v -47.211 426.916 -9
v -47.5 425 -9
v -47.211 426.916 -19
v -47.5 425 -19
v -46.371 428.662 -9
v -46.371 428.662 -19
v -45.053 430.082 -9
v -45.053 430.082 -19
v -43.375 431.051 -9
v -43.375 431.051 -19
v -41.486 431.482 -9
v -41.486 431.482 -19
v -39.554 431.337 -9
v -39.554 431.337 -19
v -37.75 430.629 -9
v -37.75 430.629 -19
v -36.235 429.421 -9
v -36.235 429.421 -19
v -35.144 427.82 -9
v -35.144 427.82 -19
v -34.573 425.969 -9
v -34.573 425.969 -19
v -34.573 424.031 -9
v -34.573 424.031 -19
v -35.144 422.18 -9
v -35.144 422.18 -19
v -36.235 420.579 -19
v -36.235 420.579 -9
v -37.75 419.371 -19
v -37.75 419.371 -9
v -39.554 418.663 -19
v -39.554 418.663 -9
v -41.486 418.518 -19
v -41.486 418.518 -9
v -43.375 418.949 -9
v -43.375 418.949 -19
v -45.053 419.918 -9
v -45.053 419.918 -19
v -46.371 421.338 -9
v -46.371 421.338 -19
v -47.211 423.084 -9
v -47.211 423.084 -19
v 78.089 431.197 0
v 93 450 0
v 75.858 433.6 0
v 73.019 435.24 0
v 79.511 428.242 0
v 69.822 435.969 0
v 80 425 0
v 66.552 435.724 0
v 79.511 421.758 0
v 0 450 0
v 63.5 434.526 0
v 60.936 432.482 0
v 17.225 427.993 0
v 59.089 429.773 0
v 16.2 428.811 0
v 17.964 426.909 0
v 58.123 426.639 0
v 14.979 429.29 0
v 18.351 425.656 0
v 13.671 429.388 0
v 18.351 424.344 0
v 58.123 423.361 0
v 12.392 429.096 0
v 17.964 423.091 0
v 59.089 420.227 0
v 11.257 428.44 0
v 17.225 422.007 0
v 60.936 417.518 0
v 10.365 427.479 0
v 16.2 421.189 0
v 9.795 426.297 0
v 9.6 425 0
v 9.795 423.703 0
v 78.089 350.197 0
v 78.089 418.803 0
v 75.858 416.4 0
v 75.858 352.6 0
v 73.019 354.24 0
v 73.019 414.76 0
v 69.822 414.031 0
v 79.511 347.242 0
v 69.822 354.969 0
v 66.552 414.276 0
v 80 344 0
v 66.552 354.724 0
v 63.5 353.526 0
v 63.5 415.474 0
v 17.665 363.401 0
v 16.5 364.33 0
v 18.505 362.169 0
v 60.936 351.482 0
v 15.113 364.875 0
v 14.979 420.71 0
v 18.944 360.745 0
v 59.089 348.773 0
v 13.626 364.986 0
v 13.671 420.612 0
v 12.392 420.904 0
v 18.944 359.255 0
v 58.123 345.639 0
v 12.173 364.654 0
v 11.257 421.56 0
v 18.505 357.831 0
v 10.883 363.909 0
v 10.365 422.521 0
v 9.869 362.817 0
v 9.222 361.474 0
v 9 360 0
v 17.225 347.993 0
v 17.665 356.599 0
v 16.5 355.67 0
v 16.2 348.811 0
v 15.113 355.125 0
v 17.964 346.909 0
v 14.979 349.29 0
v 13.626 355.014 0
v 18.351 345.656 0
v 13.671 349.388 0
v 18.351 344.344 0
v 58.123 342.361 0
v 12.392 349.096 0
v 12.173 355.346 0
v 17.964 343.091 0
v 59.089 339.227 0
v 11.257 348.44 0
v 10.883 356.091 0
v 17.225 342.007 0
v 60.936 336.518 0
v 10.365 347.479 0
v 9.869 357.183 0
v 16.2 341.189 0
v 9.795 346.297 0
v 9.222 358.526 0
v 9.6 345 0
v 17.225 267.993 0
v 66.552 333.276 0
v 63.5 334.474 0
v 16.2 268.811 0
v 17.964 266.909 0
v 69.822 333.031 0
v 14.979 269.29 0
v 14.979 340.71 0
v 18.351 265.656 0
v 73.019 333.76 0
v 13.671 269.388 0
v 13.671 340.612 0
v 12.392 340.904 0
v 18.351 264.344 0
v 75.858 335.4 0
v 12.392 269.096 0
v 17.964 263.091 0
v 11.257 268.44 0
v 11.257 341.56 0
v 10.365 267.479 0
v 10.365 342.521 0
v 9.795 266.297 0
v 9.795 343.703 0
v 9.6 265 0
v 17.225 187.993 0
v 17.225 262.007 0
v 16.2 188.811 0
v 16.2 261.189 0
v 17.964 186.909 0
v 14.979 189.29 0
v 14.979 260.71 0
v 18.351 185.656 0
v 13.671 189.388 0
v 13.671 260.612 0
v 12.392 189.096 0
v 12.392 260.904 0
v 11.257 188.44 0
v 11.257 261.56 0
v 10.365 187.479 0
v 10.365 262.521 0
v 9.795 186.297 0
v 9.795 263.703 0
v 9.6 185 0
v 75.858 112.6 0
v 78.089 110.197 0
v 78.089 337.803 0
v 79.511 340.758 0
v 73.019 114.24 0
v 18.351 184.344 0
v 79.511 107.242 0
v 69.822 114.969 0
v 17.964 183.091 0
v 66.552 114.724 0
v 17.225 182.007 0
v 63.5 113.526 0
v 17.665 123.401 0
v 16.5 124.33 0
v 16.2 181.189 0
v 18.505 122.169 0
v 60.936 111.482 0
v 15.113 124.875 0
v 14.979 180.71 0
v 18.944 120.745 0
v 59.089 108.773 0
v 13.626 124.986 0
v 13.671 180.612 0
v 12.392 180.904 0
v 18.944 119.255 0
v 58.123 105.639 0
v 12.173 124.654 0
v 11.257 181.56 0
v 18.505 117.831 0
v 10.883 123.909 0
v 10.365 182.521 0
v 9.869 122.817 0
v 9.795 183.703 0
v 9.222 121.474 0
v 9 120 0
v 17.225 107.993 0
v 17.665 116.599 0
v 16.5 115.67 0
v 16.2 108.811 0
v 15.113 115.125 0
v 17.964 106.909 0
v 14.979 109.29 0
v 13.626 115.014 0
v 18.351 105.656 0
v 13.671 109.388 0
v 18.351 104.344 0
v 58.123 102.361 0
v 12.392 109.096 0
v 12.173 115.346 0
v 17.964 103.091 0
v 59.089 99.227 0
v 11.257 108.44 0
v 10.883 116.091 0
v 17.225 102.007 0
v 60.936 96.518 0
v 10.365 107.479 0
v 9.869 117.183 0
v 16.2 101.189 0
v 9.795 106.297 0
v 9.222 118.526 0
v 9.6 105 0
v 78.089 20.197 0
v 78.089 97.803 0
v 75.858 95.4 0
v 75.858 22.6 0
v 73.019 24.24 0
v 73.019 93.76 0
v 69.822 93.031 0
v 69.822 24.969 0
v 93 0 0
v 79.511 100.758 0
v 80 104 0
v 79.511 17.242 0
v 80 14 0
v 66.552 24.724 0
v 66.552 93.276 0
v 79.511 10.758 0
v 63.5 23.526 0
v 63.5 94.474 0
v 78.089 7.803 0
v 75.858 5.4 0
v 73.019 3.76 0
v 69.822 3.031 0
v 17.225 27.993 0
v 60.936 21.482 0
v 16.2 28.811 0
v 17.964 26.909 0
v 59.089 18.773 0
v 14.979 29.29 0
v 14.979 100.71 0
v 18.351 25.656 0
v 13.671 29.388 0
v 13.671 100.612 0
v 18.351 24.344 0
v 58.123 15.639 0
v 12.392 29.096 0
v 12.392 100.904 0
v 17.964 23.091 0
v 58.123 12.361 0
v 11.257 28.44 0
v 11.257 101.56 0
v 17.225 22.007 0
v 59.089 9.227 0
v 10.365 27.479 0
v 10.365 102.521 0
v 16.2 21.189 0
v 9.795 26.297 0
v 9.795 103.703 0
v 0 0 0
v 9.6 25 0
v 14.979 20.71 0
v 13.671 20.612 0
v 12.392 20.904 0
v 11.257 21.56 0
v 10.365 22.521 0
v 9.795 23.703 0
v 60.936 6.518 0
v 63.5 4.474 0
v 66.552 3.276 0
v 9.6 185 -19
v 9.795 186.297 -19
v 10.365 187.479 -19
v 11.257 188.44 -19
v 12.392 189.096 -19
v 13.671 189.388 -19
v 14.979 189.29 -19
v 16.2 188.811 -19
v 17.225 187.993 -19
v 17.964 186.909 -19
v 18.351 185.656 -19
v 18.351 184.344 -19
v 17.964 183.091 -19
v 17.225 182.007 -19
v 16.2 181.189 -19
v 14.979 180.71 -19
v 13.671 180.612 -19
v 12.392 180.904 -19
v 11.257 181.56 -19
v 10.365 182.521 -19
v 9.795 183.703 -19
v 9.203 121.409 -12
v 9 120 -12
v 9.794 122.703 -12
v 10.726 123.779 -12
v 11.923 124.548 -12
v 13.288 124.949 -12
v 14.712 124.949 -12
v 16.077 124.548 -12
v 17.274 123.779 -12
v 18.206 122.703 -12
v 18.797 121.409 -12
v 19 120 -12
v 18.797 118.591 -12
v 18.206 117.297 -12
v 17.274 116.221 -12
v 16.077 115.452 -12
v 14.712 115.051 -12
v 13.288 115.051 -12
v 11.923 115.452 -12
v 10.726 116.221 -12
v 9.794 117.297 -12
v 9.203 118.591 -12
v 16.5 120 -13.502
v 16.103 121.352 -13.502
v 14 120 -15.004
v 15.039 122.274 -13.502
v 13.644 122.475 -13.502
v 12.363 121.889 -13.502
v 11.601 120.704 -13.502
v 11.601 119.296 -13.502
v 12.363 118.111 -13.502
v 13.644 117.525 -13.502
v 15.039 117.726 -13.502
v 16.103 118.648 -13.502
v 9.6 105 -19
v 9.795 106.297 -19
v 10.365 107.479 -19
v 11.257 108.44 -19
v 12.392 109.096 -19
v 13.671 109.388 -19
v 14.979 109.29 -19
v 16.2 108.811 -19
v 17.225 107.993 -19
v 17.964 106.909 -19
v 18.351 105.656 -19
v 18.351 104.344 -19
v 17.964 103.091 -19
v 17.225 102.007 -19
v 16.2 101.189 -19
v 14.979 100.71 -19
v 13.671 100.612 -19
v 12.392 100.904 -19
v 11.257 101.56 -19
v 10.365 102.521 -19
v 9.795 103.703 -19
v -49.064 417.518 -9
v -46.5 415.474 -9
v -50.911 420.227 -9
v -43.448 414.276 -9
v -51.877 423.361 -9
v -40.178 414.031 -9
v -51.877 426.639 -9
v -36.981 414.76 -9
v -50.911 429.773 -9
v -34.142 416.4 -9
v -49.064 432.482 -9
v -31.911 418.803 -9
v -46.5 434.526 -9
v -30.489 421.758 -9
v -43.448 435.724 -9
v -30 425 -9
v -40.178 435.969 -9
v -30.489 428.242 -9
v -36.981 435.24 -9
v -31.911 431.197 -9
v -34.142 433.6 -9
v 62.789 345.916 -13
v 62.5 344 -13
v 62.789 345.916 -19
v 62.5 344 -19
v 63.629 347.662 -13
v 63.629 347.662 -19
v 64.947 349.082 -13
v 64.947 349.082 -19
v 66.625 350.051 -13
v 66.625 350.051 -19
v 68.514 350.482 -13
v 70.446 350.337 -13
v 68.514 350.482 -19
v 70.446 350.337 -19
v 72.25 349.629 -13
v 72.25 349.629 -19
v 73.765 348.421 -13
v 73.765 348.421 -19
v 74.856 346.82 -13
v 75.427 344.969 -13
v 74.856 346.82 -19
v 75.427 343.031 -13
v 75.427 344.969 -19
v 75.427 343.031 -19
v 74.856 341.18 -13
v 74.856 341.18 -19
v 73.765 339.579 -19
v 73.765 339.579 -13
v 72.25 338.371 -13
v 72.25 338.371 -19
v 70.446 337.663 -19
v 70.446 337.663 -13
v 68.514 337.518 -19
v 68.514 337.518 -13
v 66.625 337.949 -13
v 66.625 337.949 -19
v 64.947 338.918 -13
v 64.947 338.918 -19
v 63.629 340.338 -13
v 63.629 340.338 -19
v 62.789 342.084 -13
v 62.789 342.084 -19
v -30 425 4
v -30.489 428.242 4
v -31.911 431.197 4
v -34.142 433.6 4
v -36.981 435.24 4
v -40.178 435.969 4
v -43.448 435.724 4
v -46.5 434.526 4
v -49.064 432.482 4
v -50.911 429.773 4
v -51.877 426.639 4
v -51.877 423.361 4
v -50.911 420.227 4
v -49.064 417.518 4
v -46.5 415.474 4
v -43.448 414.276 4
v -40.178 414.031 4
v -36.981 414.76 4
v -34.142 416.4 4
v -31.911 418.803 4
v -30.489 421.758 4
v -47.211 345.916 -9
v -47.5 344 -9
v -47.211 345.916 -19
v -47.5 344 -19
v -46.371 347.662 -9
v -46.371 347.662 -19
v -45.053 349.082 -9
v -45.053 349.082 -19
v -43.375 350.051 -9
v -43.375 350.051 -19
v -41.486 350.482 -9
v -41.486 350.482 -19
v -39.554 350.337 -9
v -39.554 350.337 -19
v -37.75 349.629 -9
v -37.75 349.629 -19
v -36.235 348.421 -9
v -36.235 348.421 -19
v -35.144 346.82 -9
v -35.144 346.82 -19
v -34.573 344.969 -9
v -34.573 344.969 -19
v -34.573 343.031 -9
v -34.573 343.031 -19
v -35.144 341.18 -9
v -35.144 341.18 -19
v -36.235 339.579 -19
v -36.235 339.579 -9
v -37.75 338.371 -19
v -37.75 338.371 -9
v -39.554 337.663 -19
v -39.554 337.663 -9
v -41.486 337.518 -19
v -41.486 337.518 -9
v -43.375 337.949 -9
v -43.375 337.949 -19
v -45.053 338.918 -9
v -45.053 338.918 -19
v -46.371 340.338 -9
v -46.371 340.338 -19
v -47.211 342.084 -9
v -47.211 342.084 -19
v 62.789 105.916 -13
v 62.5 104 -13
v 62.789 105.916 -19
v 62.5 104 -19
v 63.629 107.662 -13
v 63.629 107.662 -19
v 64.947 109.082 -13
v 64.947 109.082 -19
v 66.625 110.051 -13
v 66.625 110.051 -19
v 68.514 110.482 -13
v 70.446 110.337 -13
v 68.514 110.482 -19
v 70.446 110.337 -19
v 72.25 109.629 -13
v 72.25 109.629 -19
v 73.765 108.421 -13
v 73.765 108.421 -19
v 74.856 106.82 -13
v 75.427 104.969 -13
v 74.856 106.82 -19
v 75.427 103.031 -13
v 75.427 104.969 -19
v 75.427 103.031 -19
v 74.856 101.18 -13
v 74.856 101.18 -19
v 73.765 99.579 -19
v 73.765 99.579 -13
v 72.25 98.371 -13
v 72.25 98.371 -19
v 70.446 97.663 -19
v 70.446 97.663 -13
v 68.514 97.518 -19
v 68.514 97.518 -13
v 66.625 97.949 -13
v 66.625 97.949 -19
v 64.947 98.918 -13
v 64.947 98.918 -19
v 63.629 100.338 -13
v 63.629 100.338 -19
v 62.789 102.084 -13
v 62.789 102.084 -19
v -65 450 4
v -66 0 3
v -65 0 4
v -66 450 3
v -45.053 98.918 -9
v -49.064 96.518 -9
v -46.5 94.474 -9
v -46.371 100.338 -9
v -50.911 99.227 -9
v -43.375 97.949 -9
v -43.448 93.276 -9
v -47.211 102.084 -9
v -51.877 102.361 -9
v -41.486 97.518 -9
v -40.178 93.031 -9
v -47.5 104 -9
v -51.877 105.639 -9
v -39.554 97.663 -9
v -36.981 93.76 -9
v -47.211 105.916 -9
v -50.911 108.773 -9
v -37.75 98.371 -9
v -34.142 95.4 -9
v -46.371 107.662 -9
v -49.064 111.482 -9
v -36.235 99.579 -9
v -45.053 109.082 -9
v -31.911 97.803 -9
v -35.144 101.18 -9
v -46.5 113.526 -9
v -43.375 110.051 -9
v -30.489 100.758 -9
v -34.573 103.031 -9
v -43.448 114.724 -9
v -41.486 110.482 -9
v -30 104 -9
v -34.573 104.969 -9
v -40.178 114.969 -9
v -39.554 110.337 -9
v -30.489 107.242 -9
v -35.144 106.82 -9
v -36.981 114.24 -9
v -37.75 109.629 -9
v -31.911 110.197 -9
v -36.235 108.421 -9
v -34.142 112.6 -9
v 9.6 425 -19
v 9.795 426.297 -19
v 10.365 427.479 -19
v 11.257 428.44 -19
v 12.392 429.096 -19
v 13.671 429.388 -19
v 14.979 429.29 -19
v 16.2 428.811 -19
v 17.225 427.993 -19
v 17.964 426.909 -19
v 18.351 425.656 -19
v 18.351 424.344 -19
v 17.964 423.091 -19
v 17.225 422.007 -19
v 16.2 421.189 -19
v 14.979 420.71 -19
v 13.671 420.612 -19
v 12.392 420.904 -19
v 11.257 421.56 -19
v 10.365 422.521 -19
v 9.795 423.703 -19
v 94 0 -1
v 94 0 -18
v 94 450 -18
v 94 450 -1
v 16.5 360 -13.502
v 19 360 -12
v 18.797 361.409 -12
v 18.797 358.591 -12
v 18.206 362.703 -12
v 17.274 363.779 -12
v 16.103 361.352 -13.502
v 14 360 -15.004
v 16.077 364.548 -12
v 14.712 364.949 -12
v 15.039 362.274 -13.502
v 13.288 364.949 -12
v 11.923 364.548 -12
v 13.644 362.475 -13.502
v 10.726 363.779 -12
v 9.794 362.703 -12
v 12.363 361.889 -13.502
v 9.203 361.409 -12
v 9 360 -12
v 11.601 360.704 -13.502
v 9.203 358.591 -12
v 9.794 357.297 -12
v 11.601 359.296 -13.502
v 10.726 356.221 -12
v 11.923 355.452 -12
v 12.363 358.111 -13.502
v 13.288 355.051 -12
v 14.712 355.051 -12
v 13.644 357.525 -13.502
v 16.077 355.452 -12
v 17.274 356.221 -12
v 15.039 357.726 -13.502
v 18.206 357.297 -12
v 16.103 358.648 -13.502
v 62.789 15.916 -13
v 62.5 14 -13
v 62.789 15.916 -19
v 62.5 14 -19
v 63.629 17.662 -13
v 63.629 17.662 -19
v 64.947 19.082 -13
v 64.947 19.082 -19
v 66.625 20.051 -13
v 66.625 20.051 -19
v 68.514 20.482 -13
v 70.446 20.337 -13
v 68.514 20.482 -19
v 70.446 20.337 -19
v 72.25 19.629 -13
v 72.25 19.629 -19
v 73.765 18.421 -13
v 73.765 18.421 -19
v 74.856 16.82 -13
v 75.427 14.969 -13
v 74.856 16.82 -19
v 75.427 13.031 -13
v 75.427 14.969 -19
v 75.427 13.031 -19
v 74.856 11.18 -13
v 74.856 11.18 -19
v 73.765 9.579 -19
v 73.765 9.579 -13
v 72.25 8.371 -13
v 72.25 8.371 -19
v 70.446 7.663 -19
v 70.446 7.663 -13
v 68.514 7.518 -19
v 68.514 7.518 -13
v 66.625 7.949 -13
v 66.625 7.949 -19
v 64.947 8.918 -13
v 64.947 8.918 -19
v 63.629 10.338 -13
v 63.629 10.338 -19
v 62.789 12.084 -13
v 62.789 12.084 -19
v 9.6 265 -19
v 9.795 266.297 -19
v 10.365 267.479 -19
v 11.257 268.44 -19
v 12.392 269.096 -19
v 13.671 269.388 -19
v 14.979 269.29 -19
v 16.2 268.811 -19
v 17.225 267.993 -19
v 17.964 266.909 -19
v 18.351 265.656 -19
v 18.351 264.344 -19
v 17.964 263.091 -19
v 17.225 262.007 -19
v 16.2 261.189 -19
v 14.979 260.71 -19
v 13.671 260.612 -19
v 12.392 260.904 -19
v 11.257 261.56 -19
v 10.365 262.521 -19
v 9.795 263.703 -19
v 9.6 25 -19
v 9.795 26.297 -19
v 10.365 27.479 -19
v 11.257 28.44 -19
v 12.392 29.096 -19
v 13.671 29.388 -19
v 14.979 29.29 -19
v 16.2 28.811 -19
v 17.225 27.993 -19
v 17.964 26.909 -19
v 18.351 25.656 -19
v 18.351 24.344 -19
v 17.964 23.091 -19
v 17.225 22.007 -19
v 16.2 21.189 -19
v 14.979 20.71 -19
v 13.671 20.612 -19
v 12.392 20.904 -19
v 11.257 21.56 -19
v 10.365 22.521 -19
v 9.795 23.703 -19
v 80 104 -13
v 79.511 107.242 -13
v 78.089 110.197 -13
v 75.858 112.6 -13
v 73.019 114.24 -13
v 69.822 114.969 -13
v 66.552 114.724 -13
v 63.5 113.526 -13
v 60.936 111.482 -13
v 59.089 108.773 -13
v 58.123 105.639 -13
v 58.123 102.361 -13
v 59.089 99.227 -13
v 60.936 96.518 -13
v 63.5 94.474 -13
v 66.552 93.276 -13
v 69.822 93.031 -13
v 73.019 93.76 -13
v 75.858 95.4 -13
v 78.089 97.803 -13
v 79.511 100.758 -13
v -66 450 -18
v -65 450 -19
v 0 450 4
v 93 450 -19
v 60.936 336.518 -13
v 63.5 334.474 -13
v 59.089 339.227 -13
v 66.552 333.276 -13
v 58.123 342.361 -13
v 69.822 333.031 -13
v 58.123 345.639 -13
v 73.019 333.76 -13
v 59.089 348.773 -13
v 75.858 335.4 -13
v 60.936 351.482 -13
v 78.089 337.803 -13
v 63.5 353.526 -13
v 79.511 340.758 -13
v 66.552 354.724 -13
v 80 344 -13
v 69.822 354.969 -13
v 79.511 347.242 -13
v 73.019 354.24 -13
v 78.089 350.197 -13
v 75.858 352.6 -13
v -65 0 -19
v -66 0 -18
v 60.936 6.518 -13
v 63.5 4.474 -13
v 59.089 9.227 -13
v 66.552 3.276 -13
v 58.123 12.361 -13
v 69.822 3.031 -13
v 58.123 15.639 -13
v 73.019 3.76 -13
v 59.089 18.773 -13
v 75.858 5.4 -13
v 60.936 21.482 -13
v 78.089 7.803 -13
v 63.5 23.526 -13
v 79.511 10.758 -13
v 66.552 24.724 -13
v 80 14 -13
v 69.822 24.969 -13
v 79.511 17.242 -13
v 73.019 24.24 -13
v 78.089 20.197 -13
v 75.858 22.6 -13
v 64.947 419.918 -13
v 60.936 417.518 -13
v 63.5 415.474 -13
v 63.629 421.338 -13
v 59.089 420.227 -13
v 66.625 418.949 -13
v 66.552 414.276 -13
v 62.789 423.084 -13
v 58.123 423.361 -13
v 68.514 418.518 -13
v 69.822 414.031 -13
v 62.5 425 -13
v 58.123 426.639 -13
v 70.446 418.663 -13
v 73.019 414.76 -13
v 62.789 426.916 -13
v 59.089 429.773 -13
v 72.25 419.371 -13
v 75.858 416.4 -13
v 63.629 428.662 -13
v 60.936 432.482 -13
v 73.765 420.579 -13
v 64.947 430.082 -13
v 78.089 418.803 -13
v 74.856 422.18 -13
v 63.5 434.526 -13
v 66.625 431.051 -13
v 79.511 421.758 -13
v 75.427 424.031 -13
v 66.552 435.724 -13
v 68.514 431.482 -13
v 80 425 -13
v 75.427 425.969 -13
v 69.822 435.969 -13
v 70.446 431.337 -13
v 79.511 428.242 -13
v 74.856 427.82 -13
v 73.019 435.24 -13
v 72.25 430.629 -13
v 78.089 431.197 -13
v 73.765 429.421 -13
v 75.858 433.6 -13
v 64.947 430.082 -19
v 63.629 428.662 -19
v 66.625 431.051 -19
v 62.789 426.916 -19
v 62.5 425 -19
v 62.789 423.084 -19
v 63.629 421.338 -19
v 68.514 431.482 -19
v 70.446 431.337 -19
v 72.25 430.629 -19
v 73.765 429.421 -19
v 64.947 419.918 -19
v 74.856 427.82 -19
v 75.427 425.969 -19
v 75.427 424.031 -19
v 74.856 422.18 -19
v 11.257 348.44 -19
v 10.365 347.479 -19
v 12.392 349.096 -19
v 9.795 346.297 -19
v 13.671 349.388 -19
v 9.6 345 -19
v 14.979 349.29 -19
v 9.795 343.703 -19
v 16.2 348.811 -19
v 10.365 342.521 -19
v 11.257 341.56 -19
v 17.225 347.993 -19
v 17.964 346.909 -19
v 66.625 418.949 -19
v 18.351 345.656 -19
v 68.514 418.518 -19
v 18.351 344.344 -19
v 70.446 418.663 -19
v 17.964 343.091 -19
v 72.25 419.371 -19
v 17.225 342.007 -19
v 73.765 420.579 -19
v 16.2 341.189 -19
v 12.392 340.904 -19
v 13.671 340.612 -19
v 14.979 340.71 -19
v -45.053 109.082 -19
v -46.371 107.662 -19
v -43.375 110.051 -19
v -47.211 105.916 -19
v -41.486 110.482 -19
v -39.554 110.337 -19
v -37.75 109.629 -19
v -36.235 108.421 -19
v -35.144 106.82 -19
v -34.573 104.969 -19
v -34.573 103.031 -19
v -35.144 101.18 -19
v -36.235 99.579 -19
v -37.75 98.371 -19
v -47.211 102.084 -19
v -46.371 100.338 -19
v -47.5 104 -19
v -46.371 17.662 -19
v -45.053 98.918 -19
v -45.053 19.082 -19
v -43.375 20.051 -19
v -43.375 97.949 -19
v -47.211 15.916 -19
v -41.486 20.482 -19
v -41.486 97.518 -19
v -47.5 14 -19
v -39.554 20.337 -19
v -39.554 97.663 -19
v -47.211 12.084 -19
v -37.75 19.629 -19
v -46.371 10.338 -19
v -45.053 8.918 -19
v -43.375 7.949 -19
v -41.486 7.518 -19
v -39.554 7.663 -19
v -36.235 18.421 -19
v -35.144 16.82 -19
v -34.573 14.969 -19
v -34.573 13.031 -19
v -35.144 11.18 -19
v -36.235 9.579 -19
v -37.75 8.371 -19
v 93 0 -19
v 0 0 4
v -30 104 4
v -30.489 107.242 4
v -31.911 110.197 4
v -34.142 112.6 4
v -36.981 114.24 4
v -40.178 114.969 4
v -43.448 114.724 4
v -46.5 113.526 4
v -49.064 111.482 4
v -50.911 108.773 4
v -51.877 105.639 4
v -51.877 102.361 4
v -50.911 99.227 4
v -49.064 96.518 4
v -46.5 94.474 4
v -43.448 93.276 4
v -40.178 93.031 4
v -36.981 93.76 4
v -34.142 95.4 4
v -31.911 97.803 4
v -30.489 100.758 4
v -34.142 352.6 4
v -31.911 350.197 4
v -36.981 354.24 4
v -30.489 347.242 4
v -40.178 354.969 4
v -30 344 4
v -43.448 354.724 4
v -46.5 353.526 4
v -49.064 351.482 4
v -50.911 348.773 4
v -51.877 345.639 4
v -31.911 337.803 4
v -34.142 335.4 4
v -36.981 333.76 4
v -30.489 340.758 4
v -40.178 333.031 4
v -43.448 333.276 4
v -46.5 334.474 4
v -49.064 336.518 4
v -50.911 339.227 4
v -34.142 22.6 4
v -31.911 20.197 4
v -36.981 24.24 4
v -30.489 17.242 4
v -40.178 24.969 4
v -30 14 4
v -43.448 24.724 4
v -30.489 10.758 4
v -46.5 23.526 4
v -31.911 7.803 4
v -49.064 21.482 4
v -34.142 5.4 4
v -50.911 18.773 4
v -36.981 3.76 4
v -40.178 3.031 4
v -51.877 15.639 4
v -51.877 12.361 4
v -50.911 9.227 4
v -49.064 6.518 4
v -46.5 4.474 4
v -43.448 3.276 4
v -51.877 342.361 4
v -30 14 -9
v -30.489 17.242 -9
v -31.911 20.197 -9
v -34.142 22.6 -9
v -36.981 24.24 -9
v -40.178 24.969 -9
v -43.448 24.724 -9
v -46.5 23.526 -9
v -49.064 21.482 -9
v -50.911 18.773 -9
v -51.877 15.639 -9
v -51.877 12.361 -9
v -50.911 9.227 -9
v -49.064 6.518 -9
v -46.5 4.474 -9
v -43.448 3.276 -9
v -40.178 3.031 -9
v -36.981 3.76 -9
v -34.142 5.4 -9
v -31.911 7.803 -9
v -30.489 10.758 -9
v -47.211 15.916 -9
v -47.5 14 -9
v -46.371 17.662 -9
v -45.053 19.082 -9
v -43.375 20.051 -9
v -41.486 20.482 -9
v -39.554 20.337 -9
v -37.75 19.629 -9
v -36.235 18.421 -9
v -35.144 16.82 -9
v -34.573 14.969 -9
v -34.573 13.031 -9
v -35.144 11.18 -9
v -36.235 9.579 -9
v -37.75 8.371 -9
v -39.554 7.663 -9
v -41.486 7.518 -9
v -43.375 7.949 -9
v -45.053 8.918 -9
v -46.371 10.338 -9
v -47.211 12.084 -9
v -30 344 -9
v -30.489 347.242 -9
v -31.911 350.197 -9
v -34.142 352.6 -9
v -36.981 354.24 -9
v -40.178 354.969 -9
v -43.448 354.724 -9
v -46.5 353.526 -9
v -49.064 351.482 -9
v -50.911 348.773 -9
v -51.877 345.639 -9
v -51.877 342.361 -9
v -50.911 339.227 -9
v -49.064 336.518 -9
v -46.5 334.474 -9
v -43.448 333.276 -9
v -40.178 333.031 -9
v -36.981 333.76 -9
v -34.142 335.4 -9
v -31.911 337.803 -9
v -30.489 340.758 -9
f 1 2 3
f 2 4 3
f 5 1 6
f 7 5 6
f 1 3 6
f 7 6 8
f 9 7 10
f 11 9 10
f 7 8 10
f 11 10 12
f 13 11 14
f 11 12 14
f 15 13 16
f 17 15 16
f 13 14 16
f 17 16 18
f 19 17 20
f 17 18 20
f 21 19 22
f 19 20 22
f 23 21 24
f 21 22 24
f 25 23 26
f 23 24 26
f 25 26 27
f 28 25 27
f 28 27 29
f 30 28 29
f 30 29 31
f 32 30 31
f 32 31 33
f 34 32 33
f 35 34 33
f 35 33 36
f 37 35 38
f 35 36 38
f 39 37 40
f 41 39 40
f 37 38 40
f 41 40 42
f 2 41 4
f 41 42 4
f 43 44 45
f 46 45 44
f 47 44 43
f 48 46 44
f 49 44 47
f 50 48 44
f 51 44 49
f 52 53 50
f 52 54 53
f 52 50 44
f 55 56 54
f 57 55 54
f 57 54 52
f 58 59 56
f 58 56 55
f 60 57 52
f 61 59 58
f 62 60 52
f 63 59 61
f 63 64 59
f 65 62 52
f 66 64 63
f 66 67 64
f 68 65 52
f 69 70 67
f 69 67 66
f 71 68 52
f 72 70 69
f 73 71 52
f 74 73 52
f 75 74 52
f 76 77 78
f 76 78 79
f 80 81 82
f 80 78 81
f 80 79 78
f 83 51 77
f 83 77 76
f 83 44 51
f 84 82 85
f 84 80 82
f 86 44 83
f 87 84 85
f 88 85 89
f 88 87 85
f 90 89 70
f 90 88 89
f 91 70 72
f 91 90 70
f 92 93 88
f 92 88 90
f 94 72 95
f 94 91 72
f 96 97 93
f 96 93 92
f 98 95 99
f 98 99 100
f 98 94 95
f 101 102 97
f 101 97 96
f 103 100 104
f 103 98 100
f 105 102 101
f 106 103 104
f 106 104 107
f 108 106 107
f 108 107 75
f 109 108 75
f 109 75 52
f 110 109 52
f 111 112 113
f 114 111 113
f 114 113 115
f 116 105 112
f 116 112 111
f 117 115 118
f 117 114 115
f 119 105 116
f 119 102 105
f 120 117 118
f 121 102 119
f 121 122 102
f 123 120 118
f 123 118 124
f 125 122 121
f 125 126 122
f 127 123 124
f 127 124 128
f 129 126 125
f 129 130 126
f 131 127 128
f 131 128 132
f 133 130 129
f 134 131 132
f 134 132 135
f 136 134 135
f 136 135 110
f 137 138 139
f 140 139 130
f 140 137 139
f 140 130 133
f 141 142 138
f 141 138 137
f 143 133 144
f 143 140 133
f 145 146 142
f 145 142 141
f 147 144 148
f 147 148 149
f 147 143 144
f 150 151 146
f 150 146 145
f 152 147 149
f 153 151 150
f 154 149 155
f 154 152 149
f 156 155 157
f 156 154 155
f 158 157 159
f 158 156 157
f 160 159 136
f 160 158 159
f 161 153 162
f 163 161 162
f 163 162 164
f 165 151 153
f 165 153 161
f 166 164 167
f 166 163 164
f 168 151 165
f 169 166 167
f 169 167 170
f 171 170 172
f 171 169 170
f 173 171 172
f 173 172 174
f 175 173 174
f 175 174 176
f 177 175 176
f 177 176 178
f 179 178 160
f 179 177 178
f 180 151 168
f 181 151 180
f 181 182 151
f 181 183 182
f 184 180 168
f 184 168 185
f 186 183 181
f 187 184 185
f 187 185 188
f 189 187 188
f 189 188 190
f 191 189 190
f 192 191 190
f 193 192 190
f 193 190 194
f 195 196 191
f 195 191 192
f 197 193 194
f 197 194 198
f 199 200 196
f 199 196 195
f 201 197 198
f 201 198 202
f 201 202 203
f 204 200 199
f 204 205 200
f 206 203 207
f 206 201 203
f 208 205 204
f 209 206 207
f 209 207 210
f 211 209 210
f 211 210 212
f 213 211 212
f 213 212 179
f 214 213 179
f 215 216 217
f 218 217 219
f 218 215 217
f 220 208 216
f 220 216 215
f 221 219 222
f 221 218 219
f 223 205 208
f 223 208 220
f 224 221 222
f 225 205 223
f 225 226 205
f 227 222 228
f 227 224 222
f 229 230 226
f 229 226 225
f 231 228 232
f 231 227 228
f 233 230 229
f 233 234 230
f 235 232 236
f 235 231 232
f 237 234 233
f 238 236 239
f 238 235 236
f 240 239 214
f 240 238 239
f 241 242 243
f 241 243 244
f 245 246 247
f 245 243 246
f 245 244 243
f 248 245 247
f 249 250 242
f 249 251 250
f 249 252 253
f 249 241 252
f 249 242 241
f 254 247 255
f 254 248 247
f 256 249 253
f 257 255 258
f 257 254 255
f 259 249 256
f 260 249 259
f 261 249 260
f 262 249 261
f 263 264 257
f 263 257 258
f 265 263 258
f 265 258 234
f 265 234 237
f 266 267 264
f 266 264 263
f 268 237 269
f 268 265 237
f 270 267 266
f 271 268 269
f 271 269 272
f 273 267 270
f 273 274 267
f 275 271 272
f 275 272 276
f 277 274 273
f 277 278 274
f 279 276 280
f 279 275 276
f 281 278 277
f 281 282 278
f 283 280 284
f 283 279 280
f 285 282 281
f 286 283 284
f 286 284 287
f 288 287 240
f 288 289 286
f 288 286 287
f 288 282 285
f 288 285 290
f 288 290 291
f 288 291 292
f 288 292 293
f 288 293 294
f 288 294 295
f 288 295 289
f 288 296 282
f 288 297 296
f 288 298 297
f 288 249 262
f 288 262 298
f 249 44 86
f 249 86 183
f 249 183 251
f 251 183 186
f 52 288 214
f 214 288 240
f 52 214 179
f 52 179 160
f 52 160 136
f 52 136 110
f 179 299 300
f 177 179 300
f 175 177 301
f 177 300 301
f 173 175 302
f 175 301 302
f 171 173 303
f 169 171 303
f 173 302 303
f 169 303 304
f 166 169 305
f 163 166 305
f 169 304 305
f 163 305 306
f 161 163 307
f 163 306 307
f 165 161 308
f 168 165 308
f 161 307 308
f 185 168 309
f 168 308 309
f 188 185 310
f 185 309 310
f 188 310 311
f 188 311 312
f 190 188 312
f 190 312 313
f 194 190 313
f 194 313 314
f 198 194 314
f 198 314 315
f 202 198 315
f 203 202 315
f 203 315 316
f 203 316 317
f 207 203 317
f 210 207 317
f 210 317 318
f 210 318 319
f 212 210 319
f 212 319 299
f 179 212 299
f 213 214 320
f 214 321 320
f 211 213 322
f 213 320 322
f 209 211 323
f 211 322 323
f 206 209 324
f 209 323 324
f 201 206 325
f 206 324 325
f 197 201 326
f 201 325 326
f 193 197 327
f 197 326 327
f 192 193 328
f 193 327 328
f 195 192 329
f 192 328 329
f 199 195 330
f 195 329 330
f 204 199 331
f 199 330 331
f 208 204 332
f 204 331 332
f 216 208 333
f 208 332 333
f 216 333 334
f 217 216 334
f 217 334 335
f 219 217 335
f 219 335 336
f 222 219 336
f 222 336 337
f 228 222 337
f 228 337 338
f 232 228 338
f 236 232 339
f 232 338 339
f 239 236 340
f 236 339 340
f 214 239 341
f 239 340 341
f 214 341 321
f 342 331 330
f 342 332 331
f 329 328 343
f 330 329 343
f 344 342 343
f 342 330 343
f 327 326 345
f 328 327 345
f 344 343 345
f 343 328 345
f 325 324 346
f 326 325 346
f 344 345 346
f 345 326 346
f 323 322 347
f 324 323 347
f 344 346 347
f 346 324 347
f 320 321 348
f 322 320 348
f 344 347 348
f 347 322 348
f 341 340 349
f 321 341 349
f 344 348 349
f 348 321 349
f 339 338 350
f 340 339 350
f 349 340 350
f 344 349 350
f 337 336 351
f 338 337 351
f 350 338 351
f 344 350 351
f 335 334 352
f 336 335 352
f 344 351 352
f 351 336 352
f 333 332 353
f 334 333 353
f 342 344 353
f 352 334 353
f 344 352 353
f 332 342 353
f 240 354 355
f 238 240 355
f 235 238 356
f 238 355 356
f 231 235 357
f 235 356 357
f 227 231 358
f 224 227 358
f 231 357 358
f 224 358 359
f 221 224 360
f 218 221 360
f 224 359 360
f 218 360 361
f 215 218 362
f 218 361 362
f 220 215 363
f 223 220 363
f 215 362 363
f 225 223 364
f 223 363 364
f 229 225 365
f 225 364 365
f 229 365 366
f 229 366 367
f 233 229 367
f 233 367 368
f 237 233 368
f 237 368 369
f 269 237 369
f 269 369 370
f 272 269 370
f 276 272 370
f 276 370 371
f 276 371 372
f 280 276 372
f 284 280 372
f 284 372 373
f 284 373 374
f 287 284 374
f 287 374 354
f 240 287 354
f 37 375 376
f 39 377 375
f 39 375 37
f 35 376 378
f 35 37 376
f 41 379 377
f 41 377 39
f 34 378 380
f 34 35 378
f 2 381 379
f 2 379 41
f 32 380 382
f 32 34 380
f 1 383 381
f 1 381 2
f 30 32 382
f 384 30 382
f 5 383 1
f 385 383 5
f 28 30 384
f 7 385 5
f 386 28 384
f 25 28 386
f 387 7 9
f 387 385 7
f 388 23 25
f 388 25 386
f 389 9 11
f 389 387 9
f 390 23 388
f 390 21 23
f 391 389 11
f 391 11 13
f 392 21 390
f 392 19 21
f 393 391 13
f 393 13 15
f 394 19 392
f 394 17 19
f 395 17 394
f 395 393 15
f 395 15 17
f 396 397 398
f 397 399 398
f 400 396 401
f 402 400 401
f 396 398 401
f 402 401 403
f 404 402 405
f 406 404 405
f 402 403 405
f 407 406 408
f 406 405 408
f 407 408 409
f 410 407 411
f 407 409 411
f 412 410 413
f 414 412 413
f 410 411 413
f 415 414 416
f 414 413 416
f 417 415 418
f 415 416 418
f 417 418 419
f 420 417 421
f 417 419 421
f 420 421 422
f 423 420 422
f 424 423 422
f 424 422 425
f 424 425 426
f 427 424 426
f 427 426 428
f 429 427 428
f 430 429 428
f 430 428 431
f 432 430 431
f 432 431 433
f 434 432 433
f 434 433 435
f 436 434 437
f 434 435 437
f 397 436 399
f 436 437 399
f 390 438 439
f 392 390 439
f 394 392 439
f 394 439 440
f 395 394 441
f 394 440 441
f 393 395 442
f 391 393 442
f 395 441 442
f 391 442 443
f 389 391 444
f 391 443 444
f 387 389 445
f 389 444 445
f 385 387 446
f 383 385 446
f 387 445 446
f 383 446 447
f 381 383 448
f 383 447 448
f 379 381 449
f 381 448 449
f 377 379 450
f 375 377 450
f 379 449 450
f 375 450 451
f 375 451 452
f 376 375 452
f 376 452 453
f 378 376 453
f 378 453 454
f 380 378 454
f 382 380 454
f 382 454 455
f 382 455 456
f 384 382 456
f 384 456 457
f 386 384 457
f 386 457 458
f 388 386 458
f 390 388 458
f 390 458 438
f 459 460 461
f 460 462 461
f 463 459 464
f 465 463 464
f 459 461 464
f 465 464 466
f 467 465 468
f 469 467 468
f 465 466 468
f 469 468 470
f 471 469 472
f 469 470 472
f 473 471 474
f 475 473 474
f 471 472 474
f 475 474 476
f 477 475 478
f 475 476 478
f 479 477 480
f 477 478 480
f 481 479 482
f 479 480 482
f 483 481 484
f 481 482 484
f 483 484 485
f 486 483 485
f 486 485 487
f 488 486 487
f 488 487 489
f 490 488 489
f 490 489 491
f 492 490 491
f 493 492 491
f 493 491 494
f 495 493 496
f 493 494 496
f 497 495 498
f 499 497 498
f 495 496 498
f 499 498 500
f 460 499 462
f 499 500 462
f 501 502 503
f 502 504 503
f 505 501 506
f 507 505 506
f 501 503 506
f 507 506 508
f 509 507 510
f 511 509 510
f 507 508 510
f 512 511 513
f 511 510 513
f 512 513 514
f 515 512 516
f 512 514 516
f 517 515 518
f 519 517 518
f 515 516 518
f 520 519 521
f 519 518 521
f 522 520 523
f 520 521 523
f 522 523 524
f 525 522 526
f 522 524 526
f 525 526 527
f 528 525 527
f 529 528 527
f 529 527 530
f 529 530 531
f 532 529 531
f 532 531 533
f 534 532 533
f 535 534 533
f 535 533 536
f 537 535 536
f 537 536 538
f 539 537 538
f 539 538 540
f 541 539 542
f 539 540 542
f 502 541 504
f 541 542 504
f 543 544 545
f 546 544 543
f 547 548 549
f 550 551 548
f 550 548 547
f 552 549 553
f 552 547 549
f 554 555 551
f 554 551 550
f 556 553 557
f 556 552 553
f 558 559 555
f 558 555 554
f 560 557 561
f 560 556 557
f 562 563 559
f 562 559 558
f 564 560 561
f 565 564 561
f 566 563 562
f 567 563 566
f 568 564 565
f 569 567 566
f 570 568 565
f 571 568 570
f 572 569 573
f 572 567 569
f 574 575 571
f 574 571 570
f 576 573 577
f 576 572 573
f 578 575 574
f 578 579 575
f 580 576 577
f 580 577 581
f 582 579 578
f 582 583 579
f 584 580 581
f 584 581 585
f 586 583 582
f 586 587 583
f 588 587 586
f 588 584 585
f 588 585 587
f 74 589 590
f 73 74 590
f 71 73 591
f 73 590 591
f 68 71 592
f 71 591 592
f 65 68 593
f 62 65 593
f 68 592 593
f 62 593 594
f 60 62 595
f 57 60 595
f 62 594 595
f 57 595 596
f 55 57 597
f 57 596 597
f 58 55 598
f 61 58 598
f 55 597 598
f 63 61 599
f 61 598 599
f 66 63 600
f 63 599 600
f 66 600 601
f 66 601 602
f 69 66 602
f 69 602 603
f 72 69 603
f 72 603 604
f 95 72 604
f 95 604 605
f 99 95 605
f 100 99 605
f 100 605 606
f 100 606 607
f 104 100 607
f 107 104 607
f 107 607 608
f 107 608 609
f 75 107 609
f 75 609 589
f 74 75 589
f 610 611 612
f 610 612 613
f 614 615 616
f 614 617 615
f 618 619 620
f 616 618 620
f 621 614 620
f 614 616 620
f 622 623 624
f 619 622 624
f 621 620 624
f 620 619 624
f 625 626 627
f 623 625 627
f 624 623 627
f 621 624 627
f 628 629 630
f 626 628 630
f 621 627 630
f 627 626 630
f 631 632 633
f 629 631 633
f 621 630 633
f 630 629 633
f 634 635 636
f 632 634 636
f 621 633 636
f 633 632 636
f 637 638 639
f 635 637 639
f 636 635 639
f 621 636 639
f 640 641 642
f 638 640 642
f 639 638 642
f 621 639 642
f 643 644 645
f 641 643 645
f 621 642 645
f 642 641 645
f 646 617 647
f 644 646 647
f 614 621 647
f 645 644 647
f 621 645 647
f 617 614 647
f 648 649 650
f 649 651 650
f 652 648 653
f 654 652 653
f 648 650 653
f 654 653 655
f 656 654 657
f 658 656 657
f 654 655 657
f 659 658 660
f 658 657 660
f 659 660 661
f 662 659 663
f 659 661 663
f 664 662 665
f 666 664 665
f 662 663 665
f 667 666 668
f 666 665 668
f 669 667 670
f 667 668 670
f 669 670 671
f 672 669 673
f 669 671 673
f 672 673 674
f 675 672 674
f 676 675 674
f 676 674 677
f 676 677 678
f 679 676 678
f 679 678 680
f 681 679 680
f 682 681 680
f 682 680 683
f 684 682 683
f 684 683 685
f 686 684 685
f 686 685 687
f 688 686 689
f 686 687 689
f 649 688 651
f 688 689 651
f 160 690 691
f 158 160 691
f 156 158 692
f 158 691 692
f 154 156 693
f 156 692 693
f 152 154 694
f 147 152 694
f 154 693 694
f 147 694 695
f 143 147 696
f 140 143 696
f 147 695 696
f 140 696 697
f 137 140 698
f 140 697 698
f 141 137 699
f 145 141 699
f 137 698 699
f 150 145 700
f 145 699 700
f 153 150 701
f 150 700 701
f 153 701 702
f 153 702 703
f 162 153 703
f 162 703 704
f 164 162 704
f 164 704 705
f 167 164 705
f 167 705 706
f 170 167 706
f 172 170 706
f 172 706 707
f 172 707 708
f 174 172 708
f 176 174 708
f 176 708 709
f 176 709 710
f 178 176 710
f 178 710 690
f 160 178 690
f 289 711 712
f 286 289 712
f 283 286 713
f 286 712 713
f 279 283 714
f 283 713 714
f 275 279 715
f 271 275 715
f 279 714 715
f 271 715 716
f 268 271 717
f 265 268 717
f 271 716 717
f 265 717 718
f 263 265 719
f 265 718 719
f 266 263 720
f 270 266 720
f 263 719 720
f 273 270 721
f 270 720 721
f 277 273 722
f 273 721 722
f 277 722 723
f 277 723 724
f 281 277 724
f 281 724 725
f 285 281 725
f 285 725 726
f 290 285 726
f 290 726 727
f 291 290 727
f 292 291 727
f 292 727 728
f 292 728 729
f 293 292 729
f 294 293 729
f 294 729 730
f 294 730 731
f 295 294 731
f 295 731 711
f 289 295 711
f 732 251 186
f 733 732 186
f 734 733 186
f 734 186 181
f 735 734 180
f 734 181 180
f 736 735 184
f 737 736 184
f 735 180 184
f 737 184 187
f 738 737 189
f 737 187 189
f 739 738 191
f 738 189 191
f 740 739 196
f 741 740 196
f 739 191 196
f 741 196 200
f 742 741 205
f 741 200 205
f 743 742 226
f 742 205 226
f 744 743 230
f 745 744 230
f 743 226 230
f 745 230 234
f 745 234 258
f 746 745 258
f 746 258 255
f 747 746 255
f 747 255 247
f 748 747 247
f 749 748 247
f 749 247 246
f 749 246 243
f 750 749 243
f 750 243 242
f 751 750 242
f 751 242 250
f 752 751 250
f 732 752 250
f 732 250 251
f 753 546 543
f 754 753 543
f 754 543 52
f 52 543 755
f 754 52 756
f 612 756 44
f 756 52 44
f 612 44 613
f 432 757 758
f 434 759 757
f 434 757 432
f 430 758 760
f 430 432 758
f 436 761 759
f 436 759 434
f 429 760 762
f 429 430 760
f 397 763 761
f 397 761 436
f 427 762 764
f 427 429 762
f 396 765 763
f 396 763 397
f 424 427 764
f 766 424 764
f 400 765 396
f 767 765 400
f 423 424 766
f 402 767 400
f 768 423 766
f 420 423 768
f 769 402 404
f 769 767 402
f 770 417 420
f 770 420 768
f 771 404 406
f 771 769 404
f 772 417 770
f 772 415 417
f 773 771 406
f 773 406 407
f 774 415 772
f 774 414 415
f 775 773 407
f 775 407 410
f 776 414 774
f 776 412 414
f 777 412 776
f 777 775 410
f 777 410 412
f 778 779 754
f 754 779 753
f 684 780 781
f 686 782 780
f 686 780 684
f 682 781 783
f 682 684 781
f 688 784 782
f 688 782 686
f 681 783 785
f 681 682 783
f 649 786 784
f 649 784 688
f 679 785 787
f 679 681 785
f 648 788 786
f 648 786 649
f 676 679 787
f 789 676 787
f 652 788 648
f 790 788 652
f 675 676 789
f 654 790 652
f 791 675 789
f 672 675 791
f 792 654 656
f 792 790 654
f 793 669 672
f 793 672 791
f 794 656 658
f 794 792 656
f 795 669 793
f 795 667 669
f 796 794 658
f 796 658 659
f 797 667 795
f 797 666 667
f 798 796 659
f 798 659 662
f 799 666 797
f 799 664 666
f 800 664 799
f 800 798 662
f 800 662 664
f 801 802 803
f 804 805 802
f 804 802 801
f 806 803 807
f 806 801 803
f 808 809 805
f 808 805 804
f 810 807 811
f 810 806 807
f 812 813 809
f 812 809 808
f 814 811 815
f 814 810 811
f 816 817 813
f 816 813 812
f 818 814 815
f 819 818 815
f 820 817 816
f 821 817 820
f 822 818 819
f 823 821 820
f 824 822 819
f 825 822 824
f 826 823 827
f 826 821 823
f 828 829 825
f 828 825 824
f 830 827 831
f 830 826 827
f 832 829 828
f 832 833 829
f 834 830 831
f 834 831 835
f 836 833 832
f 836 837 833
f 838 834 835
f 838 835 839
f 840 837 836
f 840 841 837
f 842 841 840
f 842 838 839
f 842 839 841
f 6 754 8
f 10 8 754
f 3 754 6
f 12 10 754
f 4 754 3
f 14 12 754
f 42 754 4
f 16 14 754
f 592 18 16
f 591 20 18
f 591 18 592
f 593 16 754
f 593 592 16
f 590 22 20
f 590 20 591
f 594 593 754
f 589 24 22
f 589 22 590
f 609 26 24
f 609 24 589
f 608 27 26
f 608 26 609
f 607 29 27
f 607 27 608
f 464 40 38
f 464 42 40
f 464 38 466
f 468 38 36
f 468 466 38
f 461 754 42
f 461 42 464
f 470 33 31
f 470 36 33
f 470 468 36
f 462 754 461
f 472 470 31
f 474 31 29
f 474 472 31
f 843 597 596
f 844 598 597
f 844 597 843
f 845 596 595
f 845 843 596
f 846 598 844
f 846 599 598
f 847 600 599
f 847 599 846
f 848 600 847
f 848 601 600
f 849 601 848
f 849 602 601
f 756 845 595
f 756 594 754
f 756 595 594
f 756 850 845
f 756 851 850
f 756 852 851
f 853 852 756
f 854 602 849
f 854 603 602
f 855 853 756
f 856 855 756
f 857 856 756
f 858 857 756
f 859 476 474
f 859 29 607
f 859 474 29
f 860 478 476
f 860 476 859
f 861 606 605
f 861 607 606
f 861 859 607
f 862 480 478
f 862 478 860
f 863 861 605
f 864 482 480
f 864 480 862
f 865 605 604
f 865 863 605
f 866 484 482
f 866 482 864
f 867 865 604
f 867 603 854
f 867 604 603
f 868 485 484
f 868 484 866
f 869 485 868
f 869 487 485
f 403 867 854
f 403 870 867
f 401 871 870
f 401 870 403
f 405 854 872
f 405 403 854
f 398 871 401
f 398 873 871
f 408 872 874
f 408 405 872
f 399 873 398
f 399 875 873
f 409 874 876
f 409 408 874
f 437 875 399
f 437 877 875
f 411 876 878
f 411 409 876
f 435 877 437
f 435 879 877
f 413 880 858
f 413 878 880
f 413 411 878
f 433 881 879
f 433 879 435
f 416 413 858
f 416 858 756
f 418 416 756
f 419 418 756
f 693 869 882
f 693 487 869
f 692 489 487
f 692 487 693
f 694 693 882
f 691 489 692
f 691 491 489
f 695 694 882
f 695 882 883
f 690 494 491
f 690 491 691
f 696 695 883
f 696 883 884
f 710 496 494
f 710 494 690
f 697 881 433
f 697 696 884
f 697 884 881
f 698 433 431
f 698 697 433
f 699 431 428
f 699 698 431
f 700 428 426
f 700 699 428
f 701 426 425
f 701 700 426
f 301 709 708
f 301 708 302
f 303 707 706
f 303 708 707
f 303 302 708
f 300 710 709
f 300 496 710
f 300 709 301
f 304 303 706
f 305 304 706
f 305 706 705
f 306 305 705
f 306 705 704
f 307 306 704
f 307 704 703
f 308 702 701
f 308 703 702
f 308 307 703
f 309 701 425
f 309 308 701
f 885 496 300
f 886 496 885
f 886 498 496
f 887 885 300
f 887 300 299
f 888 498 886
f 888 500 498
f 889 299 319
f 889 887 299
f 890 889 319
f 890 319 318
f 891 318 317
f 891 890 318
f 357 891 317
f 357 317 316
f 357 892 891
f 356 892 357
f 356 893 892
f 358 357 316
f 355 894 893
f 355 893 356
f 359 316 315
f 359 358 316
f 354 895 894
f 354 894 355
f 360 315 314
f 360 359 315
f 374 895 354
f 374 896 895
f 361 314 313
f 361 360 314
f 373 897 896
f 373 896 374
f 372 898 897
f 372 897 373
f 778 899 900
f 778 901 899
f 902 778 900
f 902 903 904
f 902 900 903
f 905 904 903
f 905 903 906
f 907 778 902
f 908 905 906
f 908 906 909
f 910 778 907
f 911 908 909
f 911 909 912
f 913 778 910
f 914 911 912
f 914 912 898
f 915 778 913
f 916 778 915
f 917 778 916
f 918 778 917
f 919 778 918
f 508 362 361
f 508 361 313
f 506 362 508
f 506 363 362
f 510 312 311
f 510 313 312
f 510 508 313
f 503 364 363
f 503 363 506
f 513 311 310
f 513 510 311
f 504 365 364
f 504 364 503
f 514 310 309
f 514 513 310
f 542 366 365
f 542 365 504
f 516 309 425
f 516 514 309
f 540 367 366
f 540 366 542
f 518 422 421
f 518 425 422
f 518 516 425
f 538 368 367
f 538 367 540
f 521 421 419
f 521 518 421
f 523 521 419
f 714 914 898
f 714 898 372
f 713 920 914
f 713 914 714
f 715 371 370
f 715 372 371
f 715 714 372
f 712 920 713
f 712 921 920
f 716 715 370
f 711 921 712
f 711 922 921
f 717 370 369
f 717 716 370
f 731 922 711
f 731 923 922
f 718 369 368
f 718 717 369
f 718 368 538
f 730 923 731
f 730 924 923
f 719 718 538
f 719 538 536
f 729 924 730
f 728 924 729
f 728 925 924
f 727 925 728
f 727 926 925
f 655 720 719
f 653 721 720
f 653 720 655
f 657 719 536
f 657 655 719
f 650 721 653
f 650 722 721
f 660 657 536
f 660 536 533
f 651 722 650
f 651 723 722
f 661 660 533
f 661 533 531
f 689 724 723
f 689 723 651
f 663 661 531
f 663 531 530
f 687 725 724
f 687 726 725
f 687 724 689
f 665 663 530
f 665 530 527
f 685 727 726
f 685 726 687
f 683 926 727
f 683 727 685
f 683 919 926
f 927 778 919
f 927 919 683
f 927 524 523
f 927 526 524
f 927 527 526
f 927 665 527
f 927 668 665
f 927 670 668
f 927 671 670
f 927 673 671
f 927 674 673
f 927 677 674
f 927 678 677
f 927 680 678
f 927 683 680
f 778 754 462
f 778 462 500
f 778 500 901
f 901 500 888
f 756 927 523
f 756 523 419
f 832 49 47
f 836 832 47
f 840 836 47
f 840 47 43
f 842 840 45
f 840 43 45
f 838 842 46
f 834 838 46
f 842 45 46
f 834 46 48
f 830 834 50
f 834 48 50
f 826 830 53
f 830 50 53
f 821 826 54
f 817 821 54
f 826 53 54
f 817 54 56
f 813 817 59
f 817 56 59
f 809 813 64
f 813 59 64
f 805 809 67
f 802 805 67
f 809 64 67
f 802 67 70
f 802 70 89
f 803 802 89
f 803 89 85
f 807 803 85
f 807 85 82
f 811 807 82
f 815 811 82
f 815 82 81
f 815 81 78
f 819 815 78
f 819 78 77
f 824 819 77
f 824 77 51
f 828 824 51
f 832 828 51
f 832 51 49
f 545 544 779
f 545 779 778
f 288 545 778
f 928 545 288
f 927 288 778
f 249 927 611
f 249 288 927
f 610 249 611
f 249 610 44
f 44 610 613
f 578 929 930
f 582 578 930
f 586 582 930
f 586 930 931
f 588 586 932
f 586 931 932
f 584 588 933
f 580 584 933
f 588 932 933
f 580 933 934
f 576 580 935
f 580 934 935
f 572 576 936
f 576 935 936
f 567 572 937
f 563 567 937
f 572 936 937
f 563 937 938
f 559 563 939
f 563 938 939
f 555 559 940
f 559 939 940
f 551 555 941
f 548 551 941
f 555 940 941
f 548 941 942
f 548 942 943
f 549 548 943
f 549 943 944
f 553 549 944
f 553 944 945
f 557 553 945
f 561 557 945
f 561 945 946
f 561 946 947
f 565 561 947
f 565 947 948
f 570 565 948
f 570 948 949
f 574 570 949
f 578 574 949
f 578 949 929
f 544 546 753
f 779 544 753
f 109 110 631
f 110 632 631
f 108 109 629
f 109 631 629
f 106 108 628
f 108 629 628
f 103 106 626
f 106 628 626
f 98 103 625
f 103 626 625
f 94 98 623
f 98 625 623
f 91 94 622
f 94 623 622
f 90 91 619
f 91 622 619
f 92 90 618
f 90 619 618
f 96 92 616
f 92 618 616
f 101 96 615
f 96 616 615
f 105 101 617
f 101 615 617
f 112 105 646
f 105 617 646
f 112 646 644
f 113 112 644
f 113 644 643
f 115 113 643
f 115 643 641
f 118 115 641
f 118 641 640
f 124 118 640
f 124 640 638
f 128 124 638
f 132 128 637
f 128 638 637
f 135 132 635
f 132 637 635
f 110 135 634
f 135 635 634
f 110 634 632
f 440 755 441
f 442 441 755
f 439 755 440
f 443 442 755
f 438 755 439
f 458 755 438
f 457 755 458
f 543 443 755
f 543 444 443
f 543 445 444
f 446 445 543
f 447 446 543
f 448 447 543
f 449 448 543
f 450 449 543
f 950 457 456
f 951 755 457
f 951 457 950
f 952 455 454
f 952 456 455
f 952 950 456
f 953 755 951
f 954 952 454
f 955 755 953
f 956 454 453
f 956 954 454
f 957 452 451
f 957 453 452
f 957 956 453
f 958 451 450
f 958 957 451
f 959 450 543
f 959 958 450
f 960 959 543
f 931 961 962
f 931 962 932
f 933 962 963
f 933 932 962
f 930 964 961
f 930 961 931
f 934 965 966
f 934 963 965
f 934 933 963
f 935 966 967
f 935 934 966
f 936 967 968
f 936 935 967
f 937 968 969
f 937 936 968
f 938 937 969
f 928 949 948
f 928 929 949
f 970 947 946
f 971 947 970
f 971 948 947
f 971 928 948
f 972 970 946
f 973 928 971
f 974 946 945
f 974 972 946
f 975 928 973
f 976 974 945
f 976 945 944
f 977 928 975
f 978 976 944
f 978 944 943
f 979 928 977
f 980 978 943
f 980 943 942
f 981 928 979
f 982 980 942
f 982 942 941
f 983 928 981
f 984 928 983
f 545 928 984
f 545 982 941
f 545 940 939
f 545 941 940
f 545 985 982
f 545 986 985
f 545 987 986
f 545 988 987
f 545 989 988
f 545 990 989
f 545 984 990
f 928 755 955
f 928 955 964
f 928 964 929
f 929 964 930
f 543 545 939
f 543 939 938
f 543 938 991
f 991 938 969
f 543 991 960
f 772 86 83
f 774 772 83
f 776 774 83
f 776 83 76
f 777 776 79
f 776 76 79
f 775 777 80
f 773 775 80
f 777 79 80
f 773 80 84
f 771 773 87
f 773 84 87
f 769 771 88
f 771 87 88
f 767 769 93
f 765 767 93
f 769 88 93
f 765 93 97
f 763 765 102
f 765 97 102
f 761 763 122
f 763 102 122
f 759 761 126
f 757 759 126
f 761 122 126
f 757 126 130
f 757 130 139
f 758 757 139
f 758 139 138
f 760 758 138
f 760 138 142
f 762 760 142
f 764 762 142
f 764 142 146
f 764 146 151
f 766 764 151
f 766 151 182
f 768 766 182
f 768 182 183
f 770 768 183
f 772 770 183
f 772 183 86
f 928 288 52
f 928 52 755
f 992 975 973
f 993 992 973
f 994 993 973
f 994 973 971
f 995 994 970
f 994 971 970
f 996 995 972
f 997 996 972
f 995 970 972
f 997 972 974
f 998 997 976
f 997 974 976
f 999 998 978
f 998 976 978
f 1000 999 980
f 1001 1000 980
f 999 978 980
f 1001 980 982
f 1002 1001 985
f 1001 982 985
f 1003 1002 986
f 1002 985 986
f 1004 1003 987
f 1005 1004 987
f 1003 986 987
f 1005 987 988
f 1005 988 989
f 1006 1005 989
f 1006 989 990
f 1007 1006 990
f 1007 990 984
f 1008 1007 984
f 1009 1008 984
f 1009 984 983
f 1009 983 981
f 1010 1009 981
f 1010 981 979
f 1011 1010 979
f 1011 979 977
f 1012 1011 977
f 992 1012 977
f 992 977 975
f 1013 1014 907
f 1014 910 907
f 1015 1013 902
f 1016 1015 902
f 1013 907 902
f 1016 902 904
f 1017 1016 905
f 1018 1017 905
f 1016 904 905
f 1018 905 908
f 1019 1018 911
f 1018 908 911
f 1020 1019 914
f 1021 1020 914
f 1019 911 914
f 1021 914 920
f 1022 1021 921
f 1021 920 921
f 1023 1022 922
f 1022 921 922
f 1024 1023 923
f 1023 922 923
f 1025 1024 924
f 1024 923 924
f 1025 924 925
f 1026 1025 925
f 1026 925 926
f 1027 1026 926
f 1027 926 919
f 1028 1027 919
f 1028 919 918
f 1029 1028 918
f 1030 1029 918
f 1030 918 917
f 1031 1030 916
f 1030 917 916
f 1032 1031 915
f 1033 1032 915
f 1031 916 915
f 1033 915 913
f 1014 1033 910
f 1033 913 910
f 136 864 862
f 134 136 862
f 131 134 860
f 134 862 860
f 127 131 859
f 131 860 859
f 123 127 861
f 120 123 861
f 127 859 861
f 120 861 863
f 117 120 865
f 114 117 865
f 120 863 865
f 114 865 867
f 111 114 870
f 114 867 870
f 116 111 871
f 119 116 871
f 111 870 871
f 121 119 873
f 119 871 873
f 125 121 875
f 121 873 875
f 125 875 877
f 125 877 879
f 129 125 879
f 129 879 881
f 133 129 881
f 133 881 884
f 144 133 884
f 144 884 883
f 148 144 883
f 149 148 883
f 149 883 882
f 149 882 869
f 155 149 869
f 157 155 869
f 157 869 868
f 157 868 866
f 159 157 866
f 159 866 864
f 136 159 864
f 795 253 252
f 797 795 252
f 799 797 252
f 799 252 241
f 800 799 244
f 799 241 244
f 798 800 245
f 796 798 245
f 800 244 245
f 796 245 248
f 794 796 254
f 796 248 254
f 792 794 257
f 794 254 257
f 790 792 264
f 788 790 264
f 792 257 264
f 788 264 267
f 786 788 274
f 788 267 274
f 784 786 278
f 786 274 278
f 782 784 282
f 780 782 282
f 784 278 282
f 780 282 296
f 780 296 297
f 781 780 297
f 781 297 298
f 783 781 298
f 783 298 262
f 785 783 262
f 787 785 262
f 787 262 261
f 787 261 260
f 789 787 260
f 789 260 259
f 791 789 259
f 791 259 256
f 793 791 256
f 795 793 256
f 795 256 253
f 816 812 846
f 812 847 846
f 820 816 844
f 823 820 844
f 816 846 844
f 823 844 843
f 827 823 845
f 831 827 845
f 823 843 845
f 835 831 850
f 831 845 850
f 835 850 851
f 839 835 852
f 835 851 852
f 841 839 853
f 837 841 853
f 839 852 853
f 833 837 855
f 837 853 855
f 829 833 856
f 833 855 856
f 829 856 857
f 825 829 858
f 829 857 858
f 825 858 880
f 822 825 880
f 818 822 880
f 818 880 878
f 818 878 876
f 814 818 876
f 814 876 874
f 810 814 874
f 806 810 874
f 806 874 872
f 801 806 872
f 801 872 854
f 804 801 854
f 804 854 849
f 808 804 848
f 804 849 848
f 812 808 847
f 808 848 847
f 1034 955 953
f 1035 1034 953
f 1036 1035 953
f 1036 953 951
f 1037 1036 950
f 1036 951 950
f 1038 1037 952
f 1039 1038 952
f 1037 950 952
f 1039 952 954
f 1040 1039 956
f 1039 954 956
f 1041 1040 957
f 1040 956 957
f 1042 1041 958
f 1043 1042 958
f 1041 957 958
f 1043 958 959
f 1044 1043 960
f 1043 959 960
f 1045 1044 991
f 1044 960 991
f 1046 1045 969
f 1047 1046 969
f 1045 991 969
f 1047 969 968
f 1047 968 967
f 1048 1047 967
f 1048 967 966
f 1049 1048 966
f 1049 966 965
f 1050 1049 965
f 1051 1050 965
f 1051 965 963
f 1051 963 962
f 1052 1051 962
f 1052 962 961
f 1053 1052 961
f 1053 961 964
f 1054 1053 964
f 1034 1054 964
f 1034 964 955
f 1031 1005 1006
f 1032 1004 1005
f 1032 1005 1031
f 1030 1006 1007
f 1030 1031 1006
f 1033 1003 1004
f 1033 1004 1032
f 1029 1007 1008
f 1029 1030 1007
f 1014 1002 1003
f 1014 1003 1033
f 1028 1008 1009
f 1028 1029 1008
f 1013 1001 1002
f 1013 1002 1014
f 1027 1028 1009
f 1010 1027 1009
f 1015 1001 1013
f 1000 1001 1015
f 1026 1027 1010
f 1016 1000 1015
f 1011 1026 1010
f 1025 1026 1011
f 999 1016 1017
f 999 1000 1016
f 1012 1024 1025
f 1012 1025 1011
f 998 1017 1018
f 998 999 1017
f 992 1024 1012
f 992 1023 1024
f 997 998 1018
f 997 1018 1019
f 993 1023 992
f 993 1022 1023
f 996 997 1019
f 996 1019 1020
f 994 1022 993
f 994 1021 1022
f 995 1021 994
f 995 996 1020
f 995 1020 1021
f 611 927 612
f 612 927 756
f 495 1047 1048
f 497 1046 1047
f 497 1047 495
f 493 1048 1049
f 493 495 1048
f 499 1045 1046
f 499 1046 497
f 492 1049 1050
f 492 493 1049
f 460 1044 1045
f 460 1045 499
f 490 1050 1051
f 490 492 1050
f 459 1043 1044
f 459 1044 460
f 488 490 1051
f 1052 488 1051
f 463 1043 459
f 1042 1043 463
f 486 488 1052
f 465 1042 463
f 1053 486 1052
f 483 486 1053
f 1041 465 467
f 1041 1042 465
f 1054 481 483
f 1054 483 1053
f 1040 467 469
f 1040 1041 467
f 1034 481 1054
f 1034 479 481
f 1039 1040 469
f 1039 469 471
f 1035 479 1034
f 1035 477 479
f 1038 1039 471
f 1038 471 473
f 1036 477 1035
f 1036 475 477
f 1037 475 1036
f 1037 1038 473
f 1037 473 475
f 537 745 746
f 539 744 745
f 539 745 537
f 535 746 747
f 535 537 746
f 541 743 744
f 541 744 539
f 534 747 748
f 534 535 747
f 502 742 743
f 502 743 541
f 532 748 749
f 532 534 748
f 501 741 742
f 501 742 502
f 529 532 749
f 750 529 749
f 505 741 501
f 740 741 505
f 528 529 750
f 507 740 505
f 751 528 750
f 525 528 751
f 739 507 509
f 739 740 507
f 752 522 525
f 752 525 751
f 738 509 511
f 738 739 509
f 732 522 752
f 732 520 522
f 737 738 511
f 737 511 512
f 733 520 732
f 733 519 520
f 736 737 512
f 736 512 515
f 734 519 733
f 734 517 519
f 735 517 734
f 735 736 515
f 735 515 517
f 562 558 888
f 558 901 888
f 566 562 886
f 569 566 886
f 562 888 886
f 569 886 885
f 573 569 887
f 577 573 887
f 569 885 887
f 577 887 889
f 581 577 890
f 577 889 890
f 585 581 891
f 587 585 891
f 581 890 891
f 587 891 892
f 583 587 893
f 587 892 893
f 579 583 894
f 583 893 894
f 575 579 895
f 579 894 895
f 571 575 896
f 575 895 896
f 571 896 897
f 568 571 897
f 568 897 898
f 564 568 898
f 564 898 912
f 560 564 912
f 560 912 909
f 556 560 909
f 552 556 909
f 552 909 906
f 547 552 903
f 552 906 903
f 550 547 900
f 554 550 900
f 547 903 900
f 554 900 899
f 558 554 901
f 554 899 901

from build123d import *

# Parameters (mm, degrees)
F1_DEPTH       = 450
F3_D           = 13
F3_DEPTH       = 25
F3_CBORE_D     = 22
F3_CBORE_DEPTH = 13
F3_TIP         = 3.9055940237
F5_D           = 13
F5_DEPTH       = 25
F5_CBORE_D     = 22
F5_CBORE_DEPTH = 13
F5_TIP         = 3.9055940237
F7_D           = 8.8
F7_DEPTH       = 25
F7_TIP         = 2.6437867237
F8_D           = 10
F8_DEPTH       = 12
F8_TIP         = 3.0043030951
F9_SIZE2       = 1
F9_SIZE        = 1


with BuildPart() as f1:
    # F0 (on Front) → F1 (new body)
    with BuildSketch(Plane.XZ):
        Polygon((94, 0), (0, 0), (0, 4), (-66, 4), (-66, -19), (94, -19), align=None)
    extrude(amount=-F1_DEPTH)

    # F3
    with Locations(Plane.XY.offset(4)):
        with Locations((-41, 425), (-41, 344), (-41, 104), (-41, 14)):
            CounterBoreHole(F3_D / 2, F3_CBORE_D / 2, F3_CBORE_DEPTH, depth=F3_DEPTH)
            with Locations((0, 0, -(F3_DEPTH + F3_TIP / 2))):  # 118° drill point
                Cone(0, F3_D / 2, F3_TIP, mode=Mode.SUBTRACT)

    # F5
    with Locations(Plane.XY):
        with Locations((69, 425), (69, 344), (69, 104), (69, 14)):
            CounterBoreHole(F5_D / 2, F5_CBORE_D / 2, F5_CBORE_DEPTH, depth=F5_DEPTH)
            with Locations((0, 0, -(F5_DEPTH + F5_TIP / 2))):  # 118° drill point
                Cone(0, F5_D / 2, F5_TIP, mode=Mode.SUBTRACT)

    # F7
    with Locations(Plane.XY):
        with Locations((14, 25), (14, 105), (14, 185), (14, 265), (14, 345), (14, 425)):
            Hole(F7_D / 2, depth=F7_DEPTH)
            with Locations((0, 0, -(F7_DEPTH + F7_TIP / 2))):  # 118° drill point
                Cone(0, F7_D / 2, F7_TIP, mode=Mode.SUBTRACT)

    # F8
    with Locations(Plane.XY):
        with Locations((14, 120), (14, 360)):
            Hole(F8_D / 2, depth=F8_DEPTH)
            with Locations((0, 0, -(F8_DEPTH + F8_TIP / 2))):  # 118° drill point
                Cone(0, F8_D / 2, F8_TIP, mode=Mode.SUBTRACT)

    # F9
    f9_edges = [f1.edges().sort_by_distance(p)[0] for p in [
        (94, 225, 0),
        (-66, 225, 4),
        (94, 225, -19),
        (-66, 225, -19),
    ]]
    chamfer(f9_edges, length=F9_SIZE, length2=F9_SIZE2)


solid = f1.part
